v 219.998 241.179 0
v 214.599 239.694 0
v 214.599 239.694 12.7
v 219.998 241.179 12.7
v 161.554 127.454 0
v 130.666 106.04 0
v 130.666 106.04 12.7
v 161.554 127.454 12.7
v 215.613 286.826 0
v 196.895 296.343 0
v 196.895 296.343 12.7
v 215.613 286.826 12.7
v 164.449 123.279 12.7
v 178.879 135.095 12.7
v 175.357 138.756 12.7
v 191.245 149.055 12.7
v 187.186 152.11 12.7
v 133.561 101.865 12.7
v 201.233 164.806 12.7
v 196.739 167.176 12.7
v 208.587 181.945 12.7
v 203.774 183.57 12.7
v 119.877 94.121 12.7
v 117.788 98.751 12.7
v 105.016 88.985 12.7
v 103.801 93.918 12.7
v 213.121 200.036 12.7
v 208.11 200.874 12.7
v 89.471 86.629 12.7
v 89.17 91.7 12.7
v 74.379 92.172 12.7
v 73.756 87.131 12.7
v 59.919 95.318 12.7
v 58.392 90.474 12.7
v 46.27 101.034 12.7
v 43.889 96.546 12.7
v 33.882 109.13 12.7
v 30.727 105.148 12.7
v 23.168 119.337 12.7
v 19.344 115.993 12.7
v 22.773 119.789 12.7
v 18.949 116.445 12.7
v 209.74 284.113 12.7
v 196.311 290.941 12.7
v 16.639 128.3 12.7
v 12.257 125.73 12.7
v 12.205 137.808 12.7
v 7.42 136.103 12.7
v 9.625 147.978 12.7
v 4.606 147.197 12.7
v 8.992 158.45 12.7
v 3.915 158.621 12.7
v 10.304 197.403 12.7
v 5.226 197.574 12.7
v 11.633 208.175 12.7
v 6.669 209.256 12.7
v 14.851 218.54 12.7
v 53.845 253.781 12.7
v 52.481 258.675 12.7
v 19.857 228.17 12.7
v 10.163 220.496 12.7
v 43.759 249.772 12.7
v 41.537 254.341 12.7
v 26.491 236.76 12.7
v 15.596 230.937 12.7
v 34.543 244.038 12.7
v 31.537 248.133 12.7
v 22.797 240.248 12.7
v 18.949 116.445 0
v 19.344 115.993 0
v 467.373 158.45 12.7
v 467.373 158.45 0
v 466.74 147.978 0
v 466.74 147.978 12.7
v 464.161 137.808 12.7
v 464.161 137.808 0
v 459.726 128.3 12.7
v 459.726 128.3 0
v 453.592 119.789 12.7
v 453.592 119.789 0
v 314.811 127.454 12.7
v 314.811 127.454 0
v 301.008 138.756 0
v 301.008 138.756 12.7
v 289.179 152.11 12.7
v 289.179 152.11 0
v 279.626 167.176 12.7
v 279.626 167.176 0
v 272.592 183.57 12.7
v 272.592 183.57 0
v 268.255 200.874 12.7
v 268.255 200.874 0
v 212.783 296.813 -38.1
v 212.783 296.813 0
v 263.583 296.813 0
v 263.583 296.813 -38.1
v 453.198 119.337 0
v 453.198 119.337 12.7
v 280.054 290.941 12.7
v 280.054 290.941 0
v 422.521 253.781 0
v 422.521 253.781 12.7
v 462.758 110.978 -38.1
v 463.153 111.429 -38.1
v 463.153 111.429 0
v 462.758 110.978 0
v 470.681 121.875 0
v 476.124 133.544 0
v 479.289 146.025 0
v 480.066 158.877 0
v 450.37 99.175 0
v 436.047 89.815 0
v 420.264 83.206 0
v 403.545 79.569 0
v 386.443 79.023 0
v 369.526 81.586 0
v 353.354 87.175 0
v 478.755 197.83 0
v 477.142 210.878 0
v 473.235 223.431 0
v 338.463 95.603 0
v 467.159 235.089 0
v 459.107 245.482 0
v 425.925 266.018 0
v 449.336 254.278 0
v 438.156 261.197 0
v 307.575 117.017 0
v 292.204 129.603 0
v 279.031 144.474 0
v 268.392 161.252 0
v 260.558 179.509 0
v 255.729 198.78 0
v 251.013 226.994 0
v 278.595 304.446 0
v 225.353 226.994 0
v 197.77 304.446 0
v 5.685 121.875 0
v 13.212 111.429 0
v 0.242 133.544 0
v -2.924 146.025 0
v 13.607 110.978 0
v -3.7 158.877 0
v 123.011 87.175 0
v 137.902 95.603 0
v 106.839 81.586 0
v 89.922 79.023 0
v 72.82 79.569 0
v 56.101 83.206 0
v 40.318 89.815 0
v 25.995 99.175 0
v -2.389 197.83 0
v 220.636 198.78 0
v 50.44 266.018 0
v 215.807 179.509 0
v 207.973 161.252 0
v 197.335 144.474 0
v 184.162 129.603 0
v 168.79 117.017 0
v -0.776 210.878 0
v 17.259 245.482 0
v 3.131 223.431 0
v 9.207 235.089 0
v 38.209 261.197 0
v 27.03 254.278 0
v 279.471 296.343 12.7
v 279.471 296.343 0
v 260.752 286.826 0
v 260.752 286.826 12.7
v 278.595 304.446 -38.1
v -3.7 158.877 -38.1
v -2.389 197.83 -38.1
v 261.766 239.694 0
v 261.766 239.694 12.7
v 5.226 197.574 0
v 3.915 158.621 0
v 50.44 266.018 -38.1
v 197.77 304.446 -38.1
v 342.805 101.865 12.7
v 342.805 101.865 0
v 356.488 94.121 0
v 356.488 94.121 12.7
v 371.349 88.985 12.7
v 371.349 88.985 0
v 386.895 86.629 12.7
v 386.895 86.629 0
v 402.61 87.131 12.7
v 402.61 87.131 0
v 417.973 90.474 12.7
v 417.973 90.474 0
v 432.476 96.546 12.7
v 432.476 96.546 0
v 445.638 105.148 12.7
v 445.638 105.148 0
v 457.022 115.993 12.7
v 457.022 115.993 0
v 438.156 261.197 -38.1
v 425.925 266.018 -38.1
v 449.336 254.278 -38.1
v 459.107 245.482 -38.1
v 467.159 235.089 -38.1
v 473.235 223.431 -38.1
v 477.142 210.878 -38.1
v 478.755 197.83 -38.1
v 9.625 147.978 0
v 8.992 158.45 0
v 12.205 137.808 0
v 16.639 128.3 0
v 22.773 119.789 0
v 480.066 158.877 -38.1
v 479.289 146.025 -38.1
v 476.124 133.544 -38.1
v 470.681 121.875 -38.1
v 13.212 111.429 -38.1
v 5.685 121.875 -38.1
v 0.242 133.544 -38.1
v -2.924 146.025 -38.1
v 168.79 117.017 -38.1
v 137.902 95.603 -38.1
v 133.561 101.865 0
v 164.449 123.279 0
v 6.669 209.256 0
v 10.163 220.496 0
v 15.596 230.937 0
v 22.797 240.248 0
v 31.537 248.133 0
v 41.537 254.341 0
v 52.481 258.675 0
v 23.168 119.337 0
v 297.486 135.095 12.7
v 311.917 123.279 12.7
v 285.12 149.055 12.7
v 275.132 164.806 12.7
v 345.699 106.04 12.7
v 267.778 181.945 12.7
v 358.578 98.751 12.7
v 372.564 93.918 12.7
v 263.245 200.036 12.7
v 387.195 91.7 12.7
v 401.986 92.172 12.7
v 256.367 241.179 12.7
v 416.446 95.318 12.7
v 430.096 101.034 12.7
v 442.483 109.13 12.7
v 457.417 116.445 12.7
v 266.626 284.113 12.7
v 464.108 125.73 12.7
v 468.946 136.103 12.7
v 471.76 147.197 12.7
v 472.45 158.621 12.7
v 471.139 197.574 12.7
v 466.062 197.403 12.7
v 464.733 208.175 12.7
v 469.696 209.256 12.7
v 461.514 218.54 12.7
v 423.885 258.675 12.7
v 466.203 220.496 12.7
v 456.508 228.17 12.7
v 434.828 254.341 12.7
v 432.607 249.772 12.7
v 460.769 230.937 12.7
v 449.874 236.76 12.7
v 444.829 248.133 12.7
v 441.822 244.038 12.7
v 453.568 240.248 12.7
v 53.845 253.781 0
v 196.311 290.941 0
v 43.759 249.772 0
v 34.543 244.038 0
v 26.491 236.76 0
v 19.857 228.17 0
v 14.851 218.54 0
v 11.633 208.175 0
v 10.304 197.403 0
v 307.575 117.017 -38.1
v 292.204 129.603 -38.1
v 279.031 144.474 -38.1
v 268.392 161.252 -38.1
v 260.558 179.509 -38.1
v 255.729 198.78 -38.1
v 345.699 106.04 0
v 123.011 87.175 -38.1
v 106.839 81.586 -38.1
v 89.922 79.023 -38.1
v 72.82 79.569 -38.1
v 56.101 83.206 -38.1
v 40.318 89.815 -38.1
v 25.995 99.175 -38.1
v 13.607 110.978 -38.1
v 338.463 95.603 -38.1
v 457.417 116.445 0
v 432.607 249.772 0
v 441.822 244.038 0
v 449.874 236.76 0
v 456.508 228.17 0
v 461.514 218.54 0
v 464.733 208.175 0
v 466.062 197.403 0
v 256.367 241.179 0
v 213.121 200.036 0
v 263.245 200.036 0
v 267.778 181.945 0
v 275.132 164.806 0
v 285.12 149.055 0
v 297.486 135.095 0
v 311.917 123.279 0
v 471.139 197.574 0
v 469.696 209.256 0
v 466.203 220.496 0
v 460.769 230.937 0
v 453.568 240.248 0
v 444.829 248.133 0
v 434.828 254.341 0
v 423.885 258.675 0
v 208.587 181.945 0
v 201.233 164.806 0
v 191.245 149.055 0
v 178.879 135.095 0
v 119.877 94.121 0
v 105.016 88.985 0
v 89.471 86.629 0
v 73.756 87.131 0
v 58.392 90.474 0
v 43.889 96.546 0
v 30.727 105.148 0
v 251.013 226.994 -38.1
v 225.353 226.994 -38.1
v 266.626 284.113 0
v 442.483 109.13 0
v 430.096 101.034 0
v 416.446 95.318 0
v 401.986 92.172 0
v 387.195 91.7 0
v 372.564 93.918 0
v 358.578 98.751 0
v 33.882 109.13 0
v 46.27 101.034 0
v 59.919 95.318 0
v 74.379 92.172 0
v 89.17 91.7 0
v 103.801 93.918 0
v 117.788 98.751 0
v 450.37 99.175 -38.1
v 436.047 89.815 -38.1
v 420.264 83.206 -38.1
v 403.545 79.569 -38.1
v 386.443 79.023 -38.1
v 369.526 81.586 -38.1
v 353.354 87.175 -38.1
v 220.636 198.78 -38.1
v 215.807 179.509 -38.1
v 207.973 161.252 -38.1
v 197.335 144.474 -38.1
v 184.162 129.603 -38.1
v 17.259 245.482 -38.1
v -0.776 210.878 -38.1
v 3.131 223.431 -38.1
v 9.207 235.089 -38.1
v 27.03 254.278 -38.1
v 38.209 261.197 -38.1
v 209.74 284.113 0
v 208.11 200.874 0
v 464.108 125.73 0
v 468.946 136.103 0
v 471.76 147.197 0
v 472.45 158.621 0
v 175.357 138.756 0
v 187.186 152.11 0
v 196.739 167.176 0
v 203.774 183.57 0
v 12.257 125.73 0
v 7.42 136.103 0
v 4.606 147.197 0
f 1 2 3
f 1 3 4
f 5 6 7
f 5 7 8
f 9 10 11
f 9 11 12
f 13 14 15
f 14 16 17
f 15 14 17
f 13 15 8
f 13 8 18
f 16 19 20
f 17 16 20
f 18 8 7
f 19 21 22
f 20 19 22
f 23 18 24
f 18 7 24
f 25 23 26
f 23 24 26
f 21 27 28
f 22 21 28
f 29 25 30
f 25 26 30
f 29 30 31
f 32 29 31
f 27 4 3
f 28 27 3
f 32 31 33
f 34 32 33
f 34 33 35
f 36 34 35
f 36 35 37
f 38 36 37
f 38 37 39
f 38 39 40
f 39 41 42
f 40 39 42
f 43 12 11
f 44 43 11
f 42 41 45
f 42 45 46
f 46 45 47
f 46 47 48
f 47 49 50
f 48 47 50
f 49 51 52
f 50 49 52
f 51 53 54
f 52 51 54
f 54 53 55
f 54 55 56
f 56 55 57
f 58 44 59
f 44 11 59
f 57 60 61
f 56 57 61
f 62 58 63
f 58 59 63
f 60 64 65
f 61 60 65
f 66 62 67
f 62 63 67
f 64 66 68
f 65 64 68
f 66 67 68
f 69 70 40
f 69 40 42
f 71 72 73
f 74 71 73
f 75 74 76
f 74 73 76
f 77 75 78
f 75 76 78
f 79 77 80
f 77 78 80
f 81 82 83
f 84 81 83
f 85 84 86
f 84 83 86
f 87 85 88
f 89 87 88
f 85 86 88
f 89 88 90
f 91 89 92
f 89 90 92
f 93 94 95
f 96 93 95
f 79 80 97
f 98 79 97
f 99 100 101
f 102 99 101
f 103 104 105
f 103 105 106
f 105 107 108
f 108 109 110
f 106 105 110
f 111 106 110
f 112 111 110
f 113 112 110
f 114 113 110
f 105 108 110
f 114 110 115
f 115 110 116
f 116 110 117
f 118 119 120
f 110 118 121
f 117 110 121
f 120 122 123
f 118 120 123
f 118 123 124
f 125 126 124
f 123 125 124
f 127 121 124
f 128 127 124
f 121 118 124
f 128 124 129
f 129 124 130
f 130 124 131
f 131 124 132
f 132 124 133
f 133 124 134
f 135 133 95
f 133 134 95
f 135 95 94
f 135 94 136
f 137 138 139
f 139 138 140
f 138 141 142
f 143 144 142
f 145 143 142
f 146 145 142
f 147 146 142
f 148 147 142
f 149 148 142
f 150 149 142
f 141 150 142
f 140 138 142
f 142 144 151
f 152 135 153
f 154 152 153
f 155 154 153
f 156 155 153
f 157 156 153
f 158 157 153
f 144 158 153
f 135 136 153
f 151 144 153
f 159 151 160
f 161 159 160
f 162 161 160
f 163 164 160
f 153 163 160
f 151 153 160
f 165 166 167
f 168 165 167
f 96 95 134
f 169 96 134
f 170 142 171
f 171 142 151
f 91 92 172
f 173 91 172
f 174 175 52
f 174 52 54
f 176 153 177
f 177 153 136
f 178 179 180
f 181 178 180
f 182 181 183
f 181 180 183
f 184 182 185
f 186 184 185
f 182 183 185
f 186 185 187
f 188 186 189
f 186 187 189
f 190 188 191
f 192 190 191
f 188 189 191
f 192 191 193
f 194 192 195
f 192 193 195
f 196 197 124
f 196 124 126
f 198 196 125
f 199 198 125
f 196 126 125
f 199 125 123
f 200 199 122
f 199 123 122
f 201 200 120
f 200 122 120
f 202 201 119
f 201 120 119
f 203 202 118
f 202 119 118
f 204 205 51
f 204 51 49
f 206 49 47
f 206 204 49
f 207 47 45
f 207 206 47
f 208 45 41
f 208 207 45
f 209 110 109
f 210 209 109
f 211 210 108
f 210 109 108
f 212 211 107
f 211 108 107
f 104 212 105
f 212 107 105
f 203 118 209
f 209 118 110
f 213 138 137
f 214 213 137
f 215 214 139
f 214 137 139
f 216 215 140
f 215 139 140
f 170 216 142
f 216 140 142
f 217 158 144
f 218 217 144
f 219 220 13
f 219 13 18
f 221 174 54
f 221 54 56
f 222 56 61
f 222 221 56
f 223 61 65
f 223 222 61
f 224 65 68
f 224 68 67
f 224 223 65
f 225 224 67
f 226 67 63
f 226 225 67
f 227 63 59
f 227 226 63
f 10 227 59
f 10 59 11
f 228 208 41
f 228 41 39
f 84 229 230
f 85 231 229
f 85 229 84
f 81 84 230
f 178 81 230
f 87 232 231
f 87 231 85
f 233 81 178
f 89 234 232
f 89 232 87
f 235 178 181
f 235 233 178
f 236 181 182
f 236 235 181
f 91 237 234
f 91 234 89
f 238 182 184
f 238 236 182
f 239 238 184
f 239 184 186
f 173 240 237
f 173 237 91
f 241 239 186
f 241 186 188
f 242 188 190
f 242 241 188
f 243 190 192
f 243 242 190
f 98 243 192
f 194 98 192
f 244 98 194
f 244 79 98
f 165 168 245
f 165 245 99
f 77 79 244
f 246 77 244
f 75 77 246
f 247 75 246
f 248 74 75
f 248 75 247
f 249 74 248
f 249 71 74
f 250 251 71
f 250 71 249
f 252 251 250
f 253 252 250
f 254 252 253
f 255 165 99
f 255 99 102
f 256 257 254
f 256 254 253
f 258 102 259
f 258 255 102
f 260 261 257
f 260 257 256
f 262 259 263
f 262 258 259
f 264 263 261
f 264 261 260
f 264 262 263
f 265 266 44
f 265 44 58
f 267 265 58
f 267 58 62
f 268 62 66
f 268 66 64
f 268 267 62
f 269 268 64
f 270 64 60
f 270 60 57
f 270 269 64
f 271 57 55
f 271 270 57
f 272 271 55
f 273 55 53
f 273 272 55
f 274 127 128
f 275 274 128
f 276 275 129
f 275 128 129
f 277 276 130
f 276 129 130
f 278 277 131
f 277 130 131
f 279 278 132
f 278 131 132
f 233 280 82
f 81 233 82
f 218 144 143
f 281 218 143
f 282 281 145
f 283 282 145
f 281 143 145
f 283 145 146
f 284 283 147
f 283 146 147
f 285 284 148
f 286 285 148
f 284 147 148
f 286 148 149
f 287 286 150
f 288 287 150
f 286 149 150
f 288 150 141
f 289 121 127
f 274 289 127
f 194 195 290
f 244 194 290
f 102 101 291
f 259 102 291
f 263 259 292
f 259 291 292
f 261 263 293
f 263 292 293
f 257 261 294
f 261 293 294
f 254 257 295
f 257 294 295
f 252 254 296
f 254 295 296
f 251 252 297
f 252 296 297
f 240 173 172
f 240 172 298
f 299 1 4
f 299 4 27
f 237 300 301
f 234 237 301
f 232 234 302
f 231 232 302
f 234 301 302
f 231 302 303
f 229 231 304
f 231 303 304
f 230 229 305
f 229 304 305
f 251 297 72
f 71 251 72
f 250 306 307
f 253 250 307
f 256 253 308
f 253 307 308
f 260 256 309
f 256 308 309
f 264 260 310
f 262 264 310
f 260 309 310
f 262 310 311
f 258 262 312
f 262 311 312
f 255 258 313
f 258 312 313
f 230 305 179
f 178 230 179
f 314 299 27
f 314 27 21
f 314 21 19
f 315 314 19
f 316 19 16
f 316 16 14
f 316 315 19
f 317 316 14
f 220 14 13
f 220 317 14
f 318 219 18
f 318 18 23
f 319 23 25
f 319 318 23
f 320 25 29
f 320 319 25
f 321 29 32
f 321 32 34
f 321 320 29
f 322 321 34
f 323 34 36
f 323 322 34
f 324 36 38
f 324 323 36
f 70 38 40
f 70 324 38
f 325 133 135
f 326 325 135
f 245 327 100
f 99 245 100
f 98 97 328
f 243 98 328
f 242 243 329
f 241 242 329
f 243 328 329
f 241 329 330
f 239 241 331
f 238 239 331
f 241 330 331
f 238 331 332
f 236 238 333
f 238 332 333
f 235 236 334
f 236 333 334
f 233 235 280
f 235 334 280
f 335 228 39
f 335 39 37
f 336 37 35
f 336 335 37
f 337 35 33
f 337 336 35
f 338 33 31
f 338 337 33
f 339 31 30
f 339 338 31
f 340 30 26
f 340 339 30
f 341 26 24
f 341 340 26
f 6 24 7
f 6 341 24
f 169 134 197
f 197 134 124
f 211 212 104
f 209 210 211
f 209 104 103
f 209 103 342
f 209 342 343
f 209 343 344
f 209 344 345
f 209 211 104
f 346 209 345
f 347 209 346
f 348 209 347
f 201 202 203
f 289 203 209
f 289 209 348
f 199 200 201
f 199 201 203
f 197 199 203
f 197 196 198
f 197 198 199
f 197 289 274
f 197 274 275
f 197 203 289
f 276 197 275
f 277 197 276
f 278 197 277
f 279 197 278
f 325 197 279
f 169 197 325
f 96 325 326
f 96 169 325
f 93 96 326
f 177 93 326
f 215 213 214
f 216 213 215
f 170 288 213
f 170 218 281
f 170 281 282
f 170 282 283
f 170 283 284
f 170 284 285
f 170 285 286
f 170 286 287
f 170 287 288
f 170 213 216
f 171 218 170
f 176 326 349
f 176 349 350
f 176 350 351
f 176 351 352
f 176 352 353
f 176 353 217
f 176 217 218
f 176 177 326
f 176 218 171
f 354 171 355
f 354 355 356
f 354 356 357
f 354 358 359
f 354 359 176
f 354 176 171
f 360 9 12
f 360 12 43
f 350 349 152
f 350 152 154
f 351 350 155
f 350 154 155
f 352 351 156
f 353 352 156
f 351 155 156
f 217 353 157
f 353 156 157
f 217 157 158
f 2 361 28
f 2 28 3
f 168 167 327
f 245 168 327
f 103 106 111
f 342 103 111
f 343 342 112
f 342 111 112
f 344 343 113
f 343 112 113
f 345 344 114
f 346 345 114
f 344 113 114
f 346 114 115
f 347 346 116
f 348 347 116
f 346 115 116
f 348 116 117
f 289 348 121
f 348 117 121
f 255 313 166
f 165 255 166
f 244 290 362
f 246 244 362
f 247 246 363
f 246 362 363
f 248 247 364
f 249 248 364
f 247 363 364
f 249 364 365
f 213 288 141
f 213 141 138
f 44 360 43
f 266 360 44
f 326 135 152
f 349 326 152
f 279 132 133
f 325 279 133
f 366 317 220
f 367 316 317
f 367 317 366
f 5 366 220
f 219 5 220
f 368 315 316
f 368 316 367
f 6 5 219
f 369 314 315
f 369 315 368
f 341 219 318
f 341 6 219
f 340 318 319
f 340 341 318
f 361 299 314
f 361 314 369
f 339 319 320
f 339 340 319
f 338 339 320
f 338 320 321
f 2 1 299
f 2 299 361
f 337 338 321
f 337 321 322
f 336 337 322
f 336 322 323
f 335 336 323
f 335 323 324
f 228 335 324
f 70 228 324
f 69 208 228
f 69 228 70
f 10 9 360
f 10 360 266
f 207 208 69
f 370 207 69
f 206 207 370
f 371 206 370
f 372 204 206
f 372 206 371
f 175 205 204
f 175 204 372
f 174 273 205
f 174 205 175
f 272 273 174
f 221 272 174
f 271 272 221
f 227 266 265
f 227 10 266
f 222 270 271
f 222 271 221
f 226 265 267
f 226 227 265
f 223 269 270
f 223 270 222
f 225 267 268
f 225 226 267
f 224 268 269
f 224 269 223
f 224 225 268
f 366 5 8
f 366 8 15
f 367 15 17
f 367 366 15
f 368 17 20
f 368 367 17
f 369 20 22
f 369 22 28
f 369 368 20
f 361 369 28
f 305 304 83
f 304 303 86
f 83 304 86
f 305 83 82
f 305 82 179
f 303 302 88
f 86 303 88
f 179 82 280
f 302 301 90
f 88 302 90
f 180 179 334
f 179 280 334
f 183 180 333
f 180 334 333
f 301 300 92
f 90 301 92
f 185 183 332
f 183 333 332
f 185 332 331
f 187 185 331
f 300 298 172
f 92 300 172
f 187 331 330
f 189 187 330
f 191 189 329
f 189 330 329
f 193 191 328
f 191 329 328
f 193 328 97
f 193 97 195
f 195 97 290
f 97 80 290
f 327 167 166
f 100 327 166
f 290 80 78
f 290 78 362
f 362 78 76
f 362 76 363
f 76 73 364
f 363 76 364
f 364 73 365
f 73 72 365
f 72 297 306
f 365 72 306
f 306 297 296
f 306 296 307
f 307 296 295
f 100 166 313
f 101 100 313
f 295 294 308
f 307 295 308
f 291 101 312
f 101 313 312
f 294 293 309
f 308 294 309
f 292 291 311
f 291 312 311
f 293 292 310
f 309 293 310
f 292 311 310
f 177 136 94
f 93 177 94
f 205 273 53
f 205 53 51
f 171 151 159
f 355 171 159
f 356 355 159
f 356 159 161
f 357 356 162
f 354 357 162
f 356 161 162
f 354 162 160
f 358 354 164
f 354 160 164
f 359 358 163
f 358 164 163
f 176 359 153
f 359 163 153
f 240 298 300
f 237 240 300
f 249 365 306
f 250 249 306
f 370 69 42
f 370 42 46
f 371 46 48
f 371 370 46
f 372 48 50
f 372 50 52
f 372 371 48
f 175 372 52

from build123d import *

# Parameters (mm, degrees)
BOSS_EXTRUDE4_DEPTH   = 12.7
BOSS_EXTRUDE4_2_DEPTH = 12.7
BOSS_EXTRUDE5_DEPTH   = 38.1


with BuildPart() as part:
    # Sketch2 → Boss-Extrude4 (new body)
    with BuildSketch(Plane.XY):
        with BuildLine():
            ThreePointArc((130.666228666, 106.040091995), (74.379304348, 92.172465986), (23.16792252, 119.337209155))
            Line((23.16792252, 119.337209155), (22.77315682, 119.78870897))
            ThreePointArc((22.77315682, 119.78870897), (12.204694496, 137.808335599), (8.992462879, 158.450062944))
            Line((8.992462879, 158.450062944), (10.303555993, 197.402864989))
            ThreePointArc((10.303555993, 197.402864989), (22.982521012, 232.613357646), (53.844679084, 253.780836152))
            Line((53.844679084, 253.780836152), (196.311281008, 290.94067285))
            Line((196.311281008, 290.94067285), (209.739641383, 284.113481114))
            Line((209.739641383, 284.113481114), (215.613399737, 286.826029602))
            Line((215.613399737, 286.826029602), (196.894837031, 296.342844243))
            Line((196.894837031, 296.342844243), (52.480544155, 258.674987582))
            ThreePointArc((52.480544155, 258.674987582), (18.98894665, 235.75335118), (5.226431104, 197.573753427))
            Line((5.226431104, 197.573753427), (3.91533799, 158.620951381))
            ThreePointArc((3.91533799, 158.620951381), (7.419590663, 136.102703369), (18.948822289, 116.444928865))
            Line((18.948822289, 116.444928865), (19.343587989, 115.99342905))
            ThreePointArc((19.343587989, 115.99342905), (73.755681182, 87.130889432), (133.560538269, 101.865242067))
            Line((133.560538269, 101.865242067), (164.448728673, 123.279182124))
            ThreePointArc((164.448728673, 123.279182124), (196.554033533, 156.731222664), (213.120538575, 200.036424744))
            Line((213.120538575, 200.036424744), (219.998210819, 241.179321991))
            Line((219.998210819, 241.179321991), (214.599432522, 239.69403431))
            Line((214.599432522, 239.69403431), (208.110063324, 200.874003253))
            ThreePointArc((208.110063324, 200.874003253), (192.26384111, 159.451636047), (161.55441907, 127.454032052))
            Line((161.55441907, 127.454032052), (130.666228666, 106.040091995))
        make_face()
    extrude(amount=BOSS_EXTRUDE4_DEPTH)


with BuildPart() as body_2:
    # Sketch2 → Boss-Extrude4 2 (new body)
    with BuildSketch(Plane.XY):
        with BuildLine():
            Line((268.255383959, 200.874003253), (261.766014761, 239.69403431))
            Line((261.766014761, 239.69403431), (256.367236464, 241.179321991))
            Line((256.367236464, 241.179321991), (263.244908708, 200.036424744))
            ThreePointArc((263.244908708, 200.036424744), (279.81141375, 156.731222664), (311.91671861, 123.279182124))
            Line((311.91671861, 123.279182124), (342.804909014, 101.865242067))
            ThreePointArc((342.804909014, 101.865242067), (402.609766101, 87.130889432), (457.021859294, 115.99342905))
            Line((457.021859294, 115.99342905), (457.416624994, 116.444928865))
            ThreePointArc((457.416624994, 116.444928865), (468.94585662, 136.102703369), (472.450109293, 158.620951381))
            Line((472.450109293, 158.620951381), (471.139016179, 197.573753427))
            ThreePointArc((471.139016179, 197.573753427), (457.376500633, 235.75335118), (423.884903128, 258.674987582))
            Line((423.884903128, 258.674987582), (279.470610252, 296.342844243))
            Line((279.470610252, 296.342844243), (260.752047545, 286.826029602))
            Line((260.752047545, 286.826029602), (266.6258059, 284.113481114))
            Line((266.6258059, 284.113481114), (280.054166275, 290.94067285))
            Line((280.054166275, 290.94067285), (422.520768199, 253.780836152))
            ThreePointArc((422.520768199, 253.780836152), (453.382926271, 232.613357646), (466.06189129, 197.402864989))
            Line((466.06189129, 197.402864989), (467.372984404, 158.450062944))
            ThreePointArc((467.372984404, 158.450062944), (464.160752787, 137.808335599), (453.592290463, 119.78870897))
            Line((453.592290463, 119.78870897), (453.197524763, 119.337209155))
            ThreePointArc((453.197524763, 119.337209155), (401.986142934, 92.172465986), (345.699218617, 106.040091995))
            Line((345.699218617, 106.040091995), (314.811028213, 127.454032052))
            ThreePointArc((314.811028213, 127.454032052), (284.101606173, 159.451636047), (268.255383959, 200.874003253))
        make_face()
    extrude(amount=BOSS_EXTRUDE4_2_DEPTH)


with BuildPart() as body_3:
    # Sketch2<7> → Boss-Extrude5 (new body)
    with BuildSketch(Plane.XY):
        with BuildLine():
            Line((13.212320492, 111.429258706), (13.607086192, 110.977758891))
            ThreePointArc((13.607086192, 110.977758891), (72.820246431, 79.568524602), (137.902002674, 95.602967174))
            Line((137.902002674, 95.602967174), (168.790193078, 117.016907231))
            ThreePointArc((168.790193078, 117.016907231), (202.989322168, 152.65060259), (220.636251451, 198.780056979))
            Line((220.636251451, 198.780056979), (225.352654567, 226.99403431))
            Line((225.352654567, 226.99403431), (251.012792715, 226.99403431))
            Line((251.012792715, 226.99403431), (255.729195832, 198.780056979))
            ThreePointArc((255.729195832, 198.780056979), (273.376125115, 152.65060259), (307.575254205, 117.016907231))
            Line((307.575254205, 117.016907231), (338.463444609, 95.602967174))
            ThreePointArc((338.463444609, 95.602967174), (403.545200852, 79.568524602), (462.758361091, 110.977758891))
            Line((462.758361091, 110.977758891), (463.153126791, 111.429258706))
            ThreePointArc((463.153126791, 111.429258706), (476.12351237, 133.544255024), (480.065796627, 158.877284038))
            Line((480.065796627, 158.877284038), (478.754703513, 197.830086083))
            ThreePointArc((478.754703513, 197.830086083), (463.365021319, 240.465642974), (425.925399797, 266.017702963))
            Line((425.925399797, 266.017702963), (278.595276217, 304.446101331))
            Line((278.595276217, 304.446101331), (263.582723641, 296.813481114))
            Line((263.582723641, 296.813481114), (212.782723641, 296.813481114))
            Line((212.782723641, 296.813481114), (197.770171066, 304.446101331))
            Line((197.770171066, 304.446101331), (50.440047486, 266.017702963))
            ThreePointArc((50.440047486, 266.017702963), (13.000425964, 240.465642974), (-2.38925623, 197.830086083))
            Line((-2.38925623, 197.830086083), (-3.700349344, 158.877284038))
            ThreePointArc((-3.700349344, 158.877284038), (0.241934913, 133.544255024), (13.212320492, 111.429258706))
        make_face()
    extrude(amount=-BOSS_EXTRUDE5_DEPTH)


solid = Compound([part.part, body_2.part, body_3.part])
